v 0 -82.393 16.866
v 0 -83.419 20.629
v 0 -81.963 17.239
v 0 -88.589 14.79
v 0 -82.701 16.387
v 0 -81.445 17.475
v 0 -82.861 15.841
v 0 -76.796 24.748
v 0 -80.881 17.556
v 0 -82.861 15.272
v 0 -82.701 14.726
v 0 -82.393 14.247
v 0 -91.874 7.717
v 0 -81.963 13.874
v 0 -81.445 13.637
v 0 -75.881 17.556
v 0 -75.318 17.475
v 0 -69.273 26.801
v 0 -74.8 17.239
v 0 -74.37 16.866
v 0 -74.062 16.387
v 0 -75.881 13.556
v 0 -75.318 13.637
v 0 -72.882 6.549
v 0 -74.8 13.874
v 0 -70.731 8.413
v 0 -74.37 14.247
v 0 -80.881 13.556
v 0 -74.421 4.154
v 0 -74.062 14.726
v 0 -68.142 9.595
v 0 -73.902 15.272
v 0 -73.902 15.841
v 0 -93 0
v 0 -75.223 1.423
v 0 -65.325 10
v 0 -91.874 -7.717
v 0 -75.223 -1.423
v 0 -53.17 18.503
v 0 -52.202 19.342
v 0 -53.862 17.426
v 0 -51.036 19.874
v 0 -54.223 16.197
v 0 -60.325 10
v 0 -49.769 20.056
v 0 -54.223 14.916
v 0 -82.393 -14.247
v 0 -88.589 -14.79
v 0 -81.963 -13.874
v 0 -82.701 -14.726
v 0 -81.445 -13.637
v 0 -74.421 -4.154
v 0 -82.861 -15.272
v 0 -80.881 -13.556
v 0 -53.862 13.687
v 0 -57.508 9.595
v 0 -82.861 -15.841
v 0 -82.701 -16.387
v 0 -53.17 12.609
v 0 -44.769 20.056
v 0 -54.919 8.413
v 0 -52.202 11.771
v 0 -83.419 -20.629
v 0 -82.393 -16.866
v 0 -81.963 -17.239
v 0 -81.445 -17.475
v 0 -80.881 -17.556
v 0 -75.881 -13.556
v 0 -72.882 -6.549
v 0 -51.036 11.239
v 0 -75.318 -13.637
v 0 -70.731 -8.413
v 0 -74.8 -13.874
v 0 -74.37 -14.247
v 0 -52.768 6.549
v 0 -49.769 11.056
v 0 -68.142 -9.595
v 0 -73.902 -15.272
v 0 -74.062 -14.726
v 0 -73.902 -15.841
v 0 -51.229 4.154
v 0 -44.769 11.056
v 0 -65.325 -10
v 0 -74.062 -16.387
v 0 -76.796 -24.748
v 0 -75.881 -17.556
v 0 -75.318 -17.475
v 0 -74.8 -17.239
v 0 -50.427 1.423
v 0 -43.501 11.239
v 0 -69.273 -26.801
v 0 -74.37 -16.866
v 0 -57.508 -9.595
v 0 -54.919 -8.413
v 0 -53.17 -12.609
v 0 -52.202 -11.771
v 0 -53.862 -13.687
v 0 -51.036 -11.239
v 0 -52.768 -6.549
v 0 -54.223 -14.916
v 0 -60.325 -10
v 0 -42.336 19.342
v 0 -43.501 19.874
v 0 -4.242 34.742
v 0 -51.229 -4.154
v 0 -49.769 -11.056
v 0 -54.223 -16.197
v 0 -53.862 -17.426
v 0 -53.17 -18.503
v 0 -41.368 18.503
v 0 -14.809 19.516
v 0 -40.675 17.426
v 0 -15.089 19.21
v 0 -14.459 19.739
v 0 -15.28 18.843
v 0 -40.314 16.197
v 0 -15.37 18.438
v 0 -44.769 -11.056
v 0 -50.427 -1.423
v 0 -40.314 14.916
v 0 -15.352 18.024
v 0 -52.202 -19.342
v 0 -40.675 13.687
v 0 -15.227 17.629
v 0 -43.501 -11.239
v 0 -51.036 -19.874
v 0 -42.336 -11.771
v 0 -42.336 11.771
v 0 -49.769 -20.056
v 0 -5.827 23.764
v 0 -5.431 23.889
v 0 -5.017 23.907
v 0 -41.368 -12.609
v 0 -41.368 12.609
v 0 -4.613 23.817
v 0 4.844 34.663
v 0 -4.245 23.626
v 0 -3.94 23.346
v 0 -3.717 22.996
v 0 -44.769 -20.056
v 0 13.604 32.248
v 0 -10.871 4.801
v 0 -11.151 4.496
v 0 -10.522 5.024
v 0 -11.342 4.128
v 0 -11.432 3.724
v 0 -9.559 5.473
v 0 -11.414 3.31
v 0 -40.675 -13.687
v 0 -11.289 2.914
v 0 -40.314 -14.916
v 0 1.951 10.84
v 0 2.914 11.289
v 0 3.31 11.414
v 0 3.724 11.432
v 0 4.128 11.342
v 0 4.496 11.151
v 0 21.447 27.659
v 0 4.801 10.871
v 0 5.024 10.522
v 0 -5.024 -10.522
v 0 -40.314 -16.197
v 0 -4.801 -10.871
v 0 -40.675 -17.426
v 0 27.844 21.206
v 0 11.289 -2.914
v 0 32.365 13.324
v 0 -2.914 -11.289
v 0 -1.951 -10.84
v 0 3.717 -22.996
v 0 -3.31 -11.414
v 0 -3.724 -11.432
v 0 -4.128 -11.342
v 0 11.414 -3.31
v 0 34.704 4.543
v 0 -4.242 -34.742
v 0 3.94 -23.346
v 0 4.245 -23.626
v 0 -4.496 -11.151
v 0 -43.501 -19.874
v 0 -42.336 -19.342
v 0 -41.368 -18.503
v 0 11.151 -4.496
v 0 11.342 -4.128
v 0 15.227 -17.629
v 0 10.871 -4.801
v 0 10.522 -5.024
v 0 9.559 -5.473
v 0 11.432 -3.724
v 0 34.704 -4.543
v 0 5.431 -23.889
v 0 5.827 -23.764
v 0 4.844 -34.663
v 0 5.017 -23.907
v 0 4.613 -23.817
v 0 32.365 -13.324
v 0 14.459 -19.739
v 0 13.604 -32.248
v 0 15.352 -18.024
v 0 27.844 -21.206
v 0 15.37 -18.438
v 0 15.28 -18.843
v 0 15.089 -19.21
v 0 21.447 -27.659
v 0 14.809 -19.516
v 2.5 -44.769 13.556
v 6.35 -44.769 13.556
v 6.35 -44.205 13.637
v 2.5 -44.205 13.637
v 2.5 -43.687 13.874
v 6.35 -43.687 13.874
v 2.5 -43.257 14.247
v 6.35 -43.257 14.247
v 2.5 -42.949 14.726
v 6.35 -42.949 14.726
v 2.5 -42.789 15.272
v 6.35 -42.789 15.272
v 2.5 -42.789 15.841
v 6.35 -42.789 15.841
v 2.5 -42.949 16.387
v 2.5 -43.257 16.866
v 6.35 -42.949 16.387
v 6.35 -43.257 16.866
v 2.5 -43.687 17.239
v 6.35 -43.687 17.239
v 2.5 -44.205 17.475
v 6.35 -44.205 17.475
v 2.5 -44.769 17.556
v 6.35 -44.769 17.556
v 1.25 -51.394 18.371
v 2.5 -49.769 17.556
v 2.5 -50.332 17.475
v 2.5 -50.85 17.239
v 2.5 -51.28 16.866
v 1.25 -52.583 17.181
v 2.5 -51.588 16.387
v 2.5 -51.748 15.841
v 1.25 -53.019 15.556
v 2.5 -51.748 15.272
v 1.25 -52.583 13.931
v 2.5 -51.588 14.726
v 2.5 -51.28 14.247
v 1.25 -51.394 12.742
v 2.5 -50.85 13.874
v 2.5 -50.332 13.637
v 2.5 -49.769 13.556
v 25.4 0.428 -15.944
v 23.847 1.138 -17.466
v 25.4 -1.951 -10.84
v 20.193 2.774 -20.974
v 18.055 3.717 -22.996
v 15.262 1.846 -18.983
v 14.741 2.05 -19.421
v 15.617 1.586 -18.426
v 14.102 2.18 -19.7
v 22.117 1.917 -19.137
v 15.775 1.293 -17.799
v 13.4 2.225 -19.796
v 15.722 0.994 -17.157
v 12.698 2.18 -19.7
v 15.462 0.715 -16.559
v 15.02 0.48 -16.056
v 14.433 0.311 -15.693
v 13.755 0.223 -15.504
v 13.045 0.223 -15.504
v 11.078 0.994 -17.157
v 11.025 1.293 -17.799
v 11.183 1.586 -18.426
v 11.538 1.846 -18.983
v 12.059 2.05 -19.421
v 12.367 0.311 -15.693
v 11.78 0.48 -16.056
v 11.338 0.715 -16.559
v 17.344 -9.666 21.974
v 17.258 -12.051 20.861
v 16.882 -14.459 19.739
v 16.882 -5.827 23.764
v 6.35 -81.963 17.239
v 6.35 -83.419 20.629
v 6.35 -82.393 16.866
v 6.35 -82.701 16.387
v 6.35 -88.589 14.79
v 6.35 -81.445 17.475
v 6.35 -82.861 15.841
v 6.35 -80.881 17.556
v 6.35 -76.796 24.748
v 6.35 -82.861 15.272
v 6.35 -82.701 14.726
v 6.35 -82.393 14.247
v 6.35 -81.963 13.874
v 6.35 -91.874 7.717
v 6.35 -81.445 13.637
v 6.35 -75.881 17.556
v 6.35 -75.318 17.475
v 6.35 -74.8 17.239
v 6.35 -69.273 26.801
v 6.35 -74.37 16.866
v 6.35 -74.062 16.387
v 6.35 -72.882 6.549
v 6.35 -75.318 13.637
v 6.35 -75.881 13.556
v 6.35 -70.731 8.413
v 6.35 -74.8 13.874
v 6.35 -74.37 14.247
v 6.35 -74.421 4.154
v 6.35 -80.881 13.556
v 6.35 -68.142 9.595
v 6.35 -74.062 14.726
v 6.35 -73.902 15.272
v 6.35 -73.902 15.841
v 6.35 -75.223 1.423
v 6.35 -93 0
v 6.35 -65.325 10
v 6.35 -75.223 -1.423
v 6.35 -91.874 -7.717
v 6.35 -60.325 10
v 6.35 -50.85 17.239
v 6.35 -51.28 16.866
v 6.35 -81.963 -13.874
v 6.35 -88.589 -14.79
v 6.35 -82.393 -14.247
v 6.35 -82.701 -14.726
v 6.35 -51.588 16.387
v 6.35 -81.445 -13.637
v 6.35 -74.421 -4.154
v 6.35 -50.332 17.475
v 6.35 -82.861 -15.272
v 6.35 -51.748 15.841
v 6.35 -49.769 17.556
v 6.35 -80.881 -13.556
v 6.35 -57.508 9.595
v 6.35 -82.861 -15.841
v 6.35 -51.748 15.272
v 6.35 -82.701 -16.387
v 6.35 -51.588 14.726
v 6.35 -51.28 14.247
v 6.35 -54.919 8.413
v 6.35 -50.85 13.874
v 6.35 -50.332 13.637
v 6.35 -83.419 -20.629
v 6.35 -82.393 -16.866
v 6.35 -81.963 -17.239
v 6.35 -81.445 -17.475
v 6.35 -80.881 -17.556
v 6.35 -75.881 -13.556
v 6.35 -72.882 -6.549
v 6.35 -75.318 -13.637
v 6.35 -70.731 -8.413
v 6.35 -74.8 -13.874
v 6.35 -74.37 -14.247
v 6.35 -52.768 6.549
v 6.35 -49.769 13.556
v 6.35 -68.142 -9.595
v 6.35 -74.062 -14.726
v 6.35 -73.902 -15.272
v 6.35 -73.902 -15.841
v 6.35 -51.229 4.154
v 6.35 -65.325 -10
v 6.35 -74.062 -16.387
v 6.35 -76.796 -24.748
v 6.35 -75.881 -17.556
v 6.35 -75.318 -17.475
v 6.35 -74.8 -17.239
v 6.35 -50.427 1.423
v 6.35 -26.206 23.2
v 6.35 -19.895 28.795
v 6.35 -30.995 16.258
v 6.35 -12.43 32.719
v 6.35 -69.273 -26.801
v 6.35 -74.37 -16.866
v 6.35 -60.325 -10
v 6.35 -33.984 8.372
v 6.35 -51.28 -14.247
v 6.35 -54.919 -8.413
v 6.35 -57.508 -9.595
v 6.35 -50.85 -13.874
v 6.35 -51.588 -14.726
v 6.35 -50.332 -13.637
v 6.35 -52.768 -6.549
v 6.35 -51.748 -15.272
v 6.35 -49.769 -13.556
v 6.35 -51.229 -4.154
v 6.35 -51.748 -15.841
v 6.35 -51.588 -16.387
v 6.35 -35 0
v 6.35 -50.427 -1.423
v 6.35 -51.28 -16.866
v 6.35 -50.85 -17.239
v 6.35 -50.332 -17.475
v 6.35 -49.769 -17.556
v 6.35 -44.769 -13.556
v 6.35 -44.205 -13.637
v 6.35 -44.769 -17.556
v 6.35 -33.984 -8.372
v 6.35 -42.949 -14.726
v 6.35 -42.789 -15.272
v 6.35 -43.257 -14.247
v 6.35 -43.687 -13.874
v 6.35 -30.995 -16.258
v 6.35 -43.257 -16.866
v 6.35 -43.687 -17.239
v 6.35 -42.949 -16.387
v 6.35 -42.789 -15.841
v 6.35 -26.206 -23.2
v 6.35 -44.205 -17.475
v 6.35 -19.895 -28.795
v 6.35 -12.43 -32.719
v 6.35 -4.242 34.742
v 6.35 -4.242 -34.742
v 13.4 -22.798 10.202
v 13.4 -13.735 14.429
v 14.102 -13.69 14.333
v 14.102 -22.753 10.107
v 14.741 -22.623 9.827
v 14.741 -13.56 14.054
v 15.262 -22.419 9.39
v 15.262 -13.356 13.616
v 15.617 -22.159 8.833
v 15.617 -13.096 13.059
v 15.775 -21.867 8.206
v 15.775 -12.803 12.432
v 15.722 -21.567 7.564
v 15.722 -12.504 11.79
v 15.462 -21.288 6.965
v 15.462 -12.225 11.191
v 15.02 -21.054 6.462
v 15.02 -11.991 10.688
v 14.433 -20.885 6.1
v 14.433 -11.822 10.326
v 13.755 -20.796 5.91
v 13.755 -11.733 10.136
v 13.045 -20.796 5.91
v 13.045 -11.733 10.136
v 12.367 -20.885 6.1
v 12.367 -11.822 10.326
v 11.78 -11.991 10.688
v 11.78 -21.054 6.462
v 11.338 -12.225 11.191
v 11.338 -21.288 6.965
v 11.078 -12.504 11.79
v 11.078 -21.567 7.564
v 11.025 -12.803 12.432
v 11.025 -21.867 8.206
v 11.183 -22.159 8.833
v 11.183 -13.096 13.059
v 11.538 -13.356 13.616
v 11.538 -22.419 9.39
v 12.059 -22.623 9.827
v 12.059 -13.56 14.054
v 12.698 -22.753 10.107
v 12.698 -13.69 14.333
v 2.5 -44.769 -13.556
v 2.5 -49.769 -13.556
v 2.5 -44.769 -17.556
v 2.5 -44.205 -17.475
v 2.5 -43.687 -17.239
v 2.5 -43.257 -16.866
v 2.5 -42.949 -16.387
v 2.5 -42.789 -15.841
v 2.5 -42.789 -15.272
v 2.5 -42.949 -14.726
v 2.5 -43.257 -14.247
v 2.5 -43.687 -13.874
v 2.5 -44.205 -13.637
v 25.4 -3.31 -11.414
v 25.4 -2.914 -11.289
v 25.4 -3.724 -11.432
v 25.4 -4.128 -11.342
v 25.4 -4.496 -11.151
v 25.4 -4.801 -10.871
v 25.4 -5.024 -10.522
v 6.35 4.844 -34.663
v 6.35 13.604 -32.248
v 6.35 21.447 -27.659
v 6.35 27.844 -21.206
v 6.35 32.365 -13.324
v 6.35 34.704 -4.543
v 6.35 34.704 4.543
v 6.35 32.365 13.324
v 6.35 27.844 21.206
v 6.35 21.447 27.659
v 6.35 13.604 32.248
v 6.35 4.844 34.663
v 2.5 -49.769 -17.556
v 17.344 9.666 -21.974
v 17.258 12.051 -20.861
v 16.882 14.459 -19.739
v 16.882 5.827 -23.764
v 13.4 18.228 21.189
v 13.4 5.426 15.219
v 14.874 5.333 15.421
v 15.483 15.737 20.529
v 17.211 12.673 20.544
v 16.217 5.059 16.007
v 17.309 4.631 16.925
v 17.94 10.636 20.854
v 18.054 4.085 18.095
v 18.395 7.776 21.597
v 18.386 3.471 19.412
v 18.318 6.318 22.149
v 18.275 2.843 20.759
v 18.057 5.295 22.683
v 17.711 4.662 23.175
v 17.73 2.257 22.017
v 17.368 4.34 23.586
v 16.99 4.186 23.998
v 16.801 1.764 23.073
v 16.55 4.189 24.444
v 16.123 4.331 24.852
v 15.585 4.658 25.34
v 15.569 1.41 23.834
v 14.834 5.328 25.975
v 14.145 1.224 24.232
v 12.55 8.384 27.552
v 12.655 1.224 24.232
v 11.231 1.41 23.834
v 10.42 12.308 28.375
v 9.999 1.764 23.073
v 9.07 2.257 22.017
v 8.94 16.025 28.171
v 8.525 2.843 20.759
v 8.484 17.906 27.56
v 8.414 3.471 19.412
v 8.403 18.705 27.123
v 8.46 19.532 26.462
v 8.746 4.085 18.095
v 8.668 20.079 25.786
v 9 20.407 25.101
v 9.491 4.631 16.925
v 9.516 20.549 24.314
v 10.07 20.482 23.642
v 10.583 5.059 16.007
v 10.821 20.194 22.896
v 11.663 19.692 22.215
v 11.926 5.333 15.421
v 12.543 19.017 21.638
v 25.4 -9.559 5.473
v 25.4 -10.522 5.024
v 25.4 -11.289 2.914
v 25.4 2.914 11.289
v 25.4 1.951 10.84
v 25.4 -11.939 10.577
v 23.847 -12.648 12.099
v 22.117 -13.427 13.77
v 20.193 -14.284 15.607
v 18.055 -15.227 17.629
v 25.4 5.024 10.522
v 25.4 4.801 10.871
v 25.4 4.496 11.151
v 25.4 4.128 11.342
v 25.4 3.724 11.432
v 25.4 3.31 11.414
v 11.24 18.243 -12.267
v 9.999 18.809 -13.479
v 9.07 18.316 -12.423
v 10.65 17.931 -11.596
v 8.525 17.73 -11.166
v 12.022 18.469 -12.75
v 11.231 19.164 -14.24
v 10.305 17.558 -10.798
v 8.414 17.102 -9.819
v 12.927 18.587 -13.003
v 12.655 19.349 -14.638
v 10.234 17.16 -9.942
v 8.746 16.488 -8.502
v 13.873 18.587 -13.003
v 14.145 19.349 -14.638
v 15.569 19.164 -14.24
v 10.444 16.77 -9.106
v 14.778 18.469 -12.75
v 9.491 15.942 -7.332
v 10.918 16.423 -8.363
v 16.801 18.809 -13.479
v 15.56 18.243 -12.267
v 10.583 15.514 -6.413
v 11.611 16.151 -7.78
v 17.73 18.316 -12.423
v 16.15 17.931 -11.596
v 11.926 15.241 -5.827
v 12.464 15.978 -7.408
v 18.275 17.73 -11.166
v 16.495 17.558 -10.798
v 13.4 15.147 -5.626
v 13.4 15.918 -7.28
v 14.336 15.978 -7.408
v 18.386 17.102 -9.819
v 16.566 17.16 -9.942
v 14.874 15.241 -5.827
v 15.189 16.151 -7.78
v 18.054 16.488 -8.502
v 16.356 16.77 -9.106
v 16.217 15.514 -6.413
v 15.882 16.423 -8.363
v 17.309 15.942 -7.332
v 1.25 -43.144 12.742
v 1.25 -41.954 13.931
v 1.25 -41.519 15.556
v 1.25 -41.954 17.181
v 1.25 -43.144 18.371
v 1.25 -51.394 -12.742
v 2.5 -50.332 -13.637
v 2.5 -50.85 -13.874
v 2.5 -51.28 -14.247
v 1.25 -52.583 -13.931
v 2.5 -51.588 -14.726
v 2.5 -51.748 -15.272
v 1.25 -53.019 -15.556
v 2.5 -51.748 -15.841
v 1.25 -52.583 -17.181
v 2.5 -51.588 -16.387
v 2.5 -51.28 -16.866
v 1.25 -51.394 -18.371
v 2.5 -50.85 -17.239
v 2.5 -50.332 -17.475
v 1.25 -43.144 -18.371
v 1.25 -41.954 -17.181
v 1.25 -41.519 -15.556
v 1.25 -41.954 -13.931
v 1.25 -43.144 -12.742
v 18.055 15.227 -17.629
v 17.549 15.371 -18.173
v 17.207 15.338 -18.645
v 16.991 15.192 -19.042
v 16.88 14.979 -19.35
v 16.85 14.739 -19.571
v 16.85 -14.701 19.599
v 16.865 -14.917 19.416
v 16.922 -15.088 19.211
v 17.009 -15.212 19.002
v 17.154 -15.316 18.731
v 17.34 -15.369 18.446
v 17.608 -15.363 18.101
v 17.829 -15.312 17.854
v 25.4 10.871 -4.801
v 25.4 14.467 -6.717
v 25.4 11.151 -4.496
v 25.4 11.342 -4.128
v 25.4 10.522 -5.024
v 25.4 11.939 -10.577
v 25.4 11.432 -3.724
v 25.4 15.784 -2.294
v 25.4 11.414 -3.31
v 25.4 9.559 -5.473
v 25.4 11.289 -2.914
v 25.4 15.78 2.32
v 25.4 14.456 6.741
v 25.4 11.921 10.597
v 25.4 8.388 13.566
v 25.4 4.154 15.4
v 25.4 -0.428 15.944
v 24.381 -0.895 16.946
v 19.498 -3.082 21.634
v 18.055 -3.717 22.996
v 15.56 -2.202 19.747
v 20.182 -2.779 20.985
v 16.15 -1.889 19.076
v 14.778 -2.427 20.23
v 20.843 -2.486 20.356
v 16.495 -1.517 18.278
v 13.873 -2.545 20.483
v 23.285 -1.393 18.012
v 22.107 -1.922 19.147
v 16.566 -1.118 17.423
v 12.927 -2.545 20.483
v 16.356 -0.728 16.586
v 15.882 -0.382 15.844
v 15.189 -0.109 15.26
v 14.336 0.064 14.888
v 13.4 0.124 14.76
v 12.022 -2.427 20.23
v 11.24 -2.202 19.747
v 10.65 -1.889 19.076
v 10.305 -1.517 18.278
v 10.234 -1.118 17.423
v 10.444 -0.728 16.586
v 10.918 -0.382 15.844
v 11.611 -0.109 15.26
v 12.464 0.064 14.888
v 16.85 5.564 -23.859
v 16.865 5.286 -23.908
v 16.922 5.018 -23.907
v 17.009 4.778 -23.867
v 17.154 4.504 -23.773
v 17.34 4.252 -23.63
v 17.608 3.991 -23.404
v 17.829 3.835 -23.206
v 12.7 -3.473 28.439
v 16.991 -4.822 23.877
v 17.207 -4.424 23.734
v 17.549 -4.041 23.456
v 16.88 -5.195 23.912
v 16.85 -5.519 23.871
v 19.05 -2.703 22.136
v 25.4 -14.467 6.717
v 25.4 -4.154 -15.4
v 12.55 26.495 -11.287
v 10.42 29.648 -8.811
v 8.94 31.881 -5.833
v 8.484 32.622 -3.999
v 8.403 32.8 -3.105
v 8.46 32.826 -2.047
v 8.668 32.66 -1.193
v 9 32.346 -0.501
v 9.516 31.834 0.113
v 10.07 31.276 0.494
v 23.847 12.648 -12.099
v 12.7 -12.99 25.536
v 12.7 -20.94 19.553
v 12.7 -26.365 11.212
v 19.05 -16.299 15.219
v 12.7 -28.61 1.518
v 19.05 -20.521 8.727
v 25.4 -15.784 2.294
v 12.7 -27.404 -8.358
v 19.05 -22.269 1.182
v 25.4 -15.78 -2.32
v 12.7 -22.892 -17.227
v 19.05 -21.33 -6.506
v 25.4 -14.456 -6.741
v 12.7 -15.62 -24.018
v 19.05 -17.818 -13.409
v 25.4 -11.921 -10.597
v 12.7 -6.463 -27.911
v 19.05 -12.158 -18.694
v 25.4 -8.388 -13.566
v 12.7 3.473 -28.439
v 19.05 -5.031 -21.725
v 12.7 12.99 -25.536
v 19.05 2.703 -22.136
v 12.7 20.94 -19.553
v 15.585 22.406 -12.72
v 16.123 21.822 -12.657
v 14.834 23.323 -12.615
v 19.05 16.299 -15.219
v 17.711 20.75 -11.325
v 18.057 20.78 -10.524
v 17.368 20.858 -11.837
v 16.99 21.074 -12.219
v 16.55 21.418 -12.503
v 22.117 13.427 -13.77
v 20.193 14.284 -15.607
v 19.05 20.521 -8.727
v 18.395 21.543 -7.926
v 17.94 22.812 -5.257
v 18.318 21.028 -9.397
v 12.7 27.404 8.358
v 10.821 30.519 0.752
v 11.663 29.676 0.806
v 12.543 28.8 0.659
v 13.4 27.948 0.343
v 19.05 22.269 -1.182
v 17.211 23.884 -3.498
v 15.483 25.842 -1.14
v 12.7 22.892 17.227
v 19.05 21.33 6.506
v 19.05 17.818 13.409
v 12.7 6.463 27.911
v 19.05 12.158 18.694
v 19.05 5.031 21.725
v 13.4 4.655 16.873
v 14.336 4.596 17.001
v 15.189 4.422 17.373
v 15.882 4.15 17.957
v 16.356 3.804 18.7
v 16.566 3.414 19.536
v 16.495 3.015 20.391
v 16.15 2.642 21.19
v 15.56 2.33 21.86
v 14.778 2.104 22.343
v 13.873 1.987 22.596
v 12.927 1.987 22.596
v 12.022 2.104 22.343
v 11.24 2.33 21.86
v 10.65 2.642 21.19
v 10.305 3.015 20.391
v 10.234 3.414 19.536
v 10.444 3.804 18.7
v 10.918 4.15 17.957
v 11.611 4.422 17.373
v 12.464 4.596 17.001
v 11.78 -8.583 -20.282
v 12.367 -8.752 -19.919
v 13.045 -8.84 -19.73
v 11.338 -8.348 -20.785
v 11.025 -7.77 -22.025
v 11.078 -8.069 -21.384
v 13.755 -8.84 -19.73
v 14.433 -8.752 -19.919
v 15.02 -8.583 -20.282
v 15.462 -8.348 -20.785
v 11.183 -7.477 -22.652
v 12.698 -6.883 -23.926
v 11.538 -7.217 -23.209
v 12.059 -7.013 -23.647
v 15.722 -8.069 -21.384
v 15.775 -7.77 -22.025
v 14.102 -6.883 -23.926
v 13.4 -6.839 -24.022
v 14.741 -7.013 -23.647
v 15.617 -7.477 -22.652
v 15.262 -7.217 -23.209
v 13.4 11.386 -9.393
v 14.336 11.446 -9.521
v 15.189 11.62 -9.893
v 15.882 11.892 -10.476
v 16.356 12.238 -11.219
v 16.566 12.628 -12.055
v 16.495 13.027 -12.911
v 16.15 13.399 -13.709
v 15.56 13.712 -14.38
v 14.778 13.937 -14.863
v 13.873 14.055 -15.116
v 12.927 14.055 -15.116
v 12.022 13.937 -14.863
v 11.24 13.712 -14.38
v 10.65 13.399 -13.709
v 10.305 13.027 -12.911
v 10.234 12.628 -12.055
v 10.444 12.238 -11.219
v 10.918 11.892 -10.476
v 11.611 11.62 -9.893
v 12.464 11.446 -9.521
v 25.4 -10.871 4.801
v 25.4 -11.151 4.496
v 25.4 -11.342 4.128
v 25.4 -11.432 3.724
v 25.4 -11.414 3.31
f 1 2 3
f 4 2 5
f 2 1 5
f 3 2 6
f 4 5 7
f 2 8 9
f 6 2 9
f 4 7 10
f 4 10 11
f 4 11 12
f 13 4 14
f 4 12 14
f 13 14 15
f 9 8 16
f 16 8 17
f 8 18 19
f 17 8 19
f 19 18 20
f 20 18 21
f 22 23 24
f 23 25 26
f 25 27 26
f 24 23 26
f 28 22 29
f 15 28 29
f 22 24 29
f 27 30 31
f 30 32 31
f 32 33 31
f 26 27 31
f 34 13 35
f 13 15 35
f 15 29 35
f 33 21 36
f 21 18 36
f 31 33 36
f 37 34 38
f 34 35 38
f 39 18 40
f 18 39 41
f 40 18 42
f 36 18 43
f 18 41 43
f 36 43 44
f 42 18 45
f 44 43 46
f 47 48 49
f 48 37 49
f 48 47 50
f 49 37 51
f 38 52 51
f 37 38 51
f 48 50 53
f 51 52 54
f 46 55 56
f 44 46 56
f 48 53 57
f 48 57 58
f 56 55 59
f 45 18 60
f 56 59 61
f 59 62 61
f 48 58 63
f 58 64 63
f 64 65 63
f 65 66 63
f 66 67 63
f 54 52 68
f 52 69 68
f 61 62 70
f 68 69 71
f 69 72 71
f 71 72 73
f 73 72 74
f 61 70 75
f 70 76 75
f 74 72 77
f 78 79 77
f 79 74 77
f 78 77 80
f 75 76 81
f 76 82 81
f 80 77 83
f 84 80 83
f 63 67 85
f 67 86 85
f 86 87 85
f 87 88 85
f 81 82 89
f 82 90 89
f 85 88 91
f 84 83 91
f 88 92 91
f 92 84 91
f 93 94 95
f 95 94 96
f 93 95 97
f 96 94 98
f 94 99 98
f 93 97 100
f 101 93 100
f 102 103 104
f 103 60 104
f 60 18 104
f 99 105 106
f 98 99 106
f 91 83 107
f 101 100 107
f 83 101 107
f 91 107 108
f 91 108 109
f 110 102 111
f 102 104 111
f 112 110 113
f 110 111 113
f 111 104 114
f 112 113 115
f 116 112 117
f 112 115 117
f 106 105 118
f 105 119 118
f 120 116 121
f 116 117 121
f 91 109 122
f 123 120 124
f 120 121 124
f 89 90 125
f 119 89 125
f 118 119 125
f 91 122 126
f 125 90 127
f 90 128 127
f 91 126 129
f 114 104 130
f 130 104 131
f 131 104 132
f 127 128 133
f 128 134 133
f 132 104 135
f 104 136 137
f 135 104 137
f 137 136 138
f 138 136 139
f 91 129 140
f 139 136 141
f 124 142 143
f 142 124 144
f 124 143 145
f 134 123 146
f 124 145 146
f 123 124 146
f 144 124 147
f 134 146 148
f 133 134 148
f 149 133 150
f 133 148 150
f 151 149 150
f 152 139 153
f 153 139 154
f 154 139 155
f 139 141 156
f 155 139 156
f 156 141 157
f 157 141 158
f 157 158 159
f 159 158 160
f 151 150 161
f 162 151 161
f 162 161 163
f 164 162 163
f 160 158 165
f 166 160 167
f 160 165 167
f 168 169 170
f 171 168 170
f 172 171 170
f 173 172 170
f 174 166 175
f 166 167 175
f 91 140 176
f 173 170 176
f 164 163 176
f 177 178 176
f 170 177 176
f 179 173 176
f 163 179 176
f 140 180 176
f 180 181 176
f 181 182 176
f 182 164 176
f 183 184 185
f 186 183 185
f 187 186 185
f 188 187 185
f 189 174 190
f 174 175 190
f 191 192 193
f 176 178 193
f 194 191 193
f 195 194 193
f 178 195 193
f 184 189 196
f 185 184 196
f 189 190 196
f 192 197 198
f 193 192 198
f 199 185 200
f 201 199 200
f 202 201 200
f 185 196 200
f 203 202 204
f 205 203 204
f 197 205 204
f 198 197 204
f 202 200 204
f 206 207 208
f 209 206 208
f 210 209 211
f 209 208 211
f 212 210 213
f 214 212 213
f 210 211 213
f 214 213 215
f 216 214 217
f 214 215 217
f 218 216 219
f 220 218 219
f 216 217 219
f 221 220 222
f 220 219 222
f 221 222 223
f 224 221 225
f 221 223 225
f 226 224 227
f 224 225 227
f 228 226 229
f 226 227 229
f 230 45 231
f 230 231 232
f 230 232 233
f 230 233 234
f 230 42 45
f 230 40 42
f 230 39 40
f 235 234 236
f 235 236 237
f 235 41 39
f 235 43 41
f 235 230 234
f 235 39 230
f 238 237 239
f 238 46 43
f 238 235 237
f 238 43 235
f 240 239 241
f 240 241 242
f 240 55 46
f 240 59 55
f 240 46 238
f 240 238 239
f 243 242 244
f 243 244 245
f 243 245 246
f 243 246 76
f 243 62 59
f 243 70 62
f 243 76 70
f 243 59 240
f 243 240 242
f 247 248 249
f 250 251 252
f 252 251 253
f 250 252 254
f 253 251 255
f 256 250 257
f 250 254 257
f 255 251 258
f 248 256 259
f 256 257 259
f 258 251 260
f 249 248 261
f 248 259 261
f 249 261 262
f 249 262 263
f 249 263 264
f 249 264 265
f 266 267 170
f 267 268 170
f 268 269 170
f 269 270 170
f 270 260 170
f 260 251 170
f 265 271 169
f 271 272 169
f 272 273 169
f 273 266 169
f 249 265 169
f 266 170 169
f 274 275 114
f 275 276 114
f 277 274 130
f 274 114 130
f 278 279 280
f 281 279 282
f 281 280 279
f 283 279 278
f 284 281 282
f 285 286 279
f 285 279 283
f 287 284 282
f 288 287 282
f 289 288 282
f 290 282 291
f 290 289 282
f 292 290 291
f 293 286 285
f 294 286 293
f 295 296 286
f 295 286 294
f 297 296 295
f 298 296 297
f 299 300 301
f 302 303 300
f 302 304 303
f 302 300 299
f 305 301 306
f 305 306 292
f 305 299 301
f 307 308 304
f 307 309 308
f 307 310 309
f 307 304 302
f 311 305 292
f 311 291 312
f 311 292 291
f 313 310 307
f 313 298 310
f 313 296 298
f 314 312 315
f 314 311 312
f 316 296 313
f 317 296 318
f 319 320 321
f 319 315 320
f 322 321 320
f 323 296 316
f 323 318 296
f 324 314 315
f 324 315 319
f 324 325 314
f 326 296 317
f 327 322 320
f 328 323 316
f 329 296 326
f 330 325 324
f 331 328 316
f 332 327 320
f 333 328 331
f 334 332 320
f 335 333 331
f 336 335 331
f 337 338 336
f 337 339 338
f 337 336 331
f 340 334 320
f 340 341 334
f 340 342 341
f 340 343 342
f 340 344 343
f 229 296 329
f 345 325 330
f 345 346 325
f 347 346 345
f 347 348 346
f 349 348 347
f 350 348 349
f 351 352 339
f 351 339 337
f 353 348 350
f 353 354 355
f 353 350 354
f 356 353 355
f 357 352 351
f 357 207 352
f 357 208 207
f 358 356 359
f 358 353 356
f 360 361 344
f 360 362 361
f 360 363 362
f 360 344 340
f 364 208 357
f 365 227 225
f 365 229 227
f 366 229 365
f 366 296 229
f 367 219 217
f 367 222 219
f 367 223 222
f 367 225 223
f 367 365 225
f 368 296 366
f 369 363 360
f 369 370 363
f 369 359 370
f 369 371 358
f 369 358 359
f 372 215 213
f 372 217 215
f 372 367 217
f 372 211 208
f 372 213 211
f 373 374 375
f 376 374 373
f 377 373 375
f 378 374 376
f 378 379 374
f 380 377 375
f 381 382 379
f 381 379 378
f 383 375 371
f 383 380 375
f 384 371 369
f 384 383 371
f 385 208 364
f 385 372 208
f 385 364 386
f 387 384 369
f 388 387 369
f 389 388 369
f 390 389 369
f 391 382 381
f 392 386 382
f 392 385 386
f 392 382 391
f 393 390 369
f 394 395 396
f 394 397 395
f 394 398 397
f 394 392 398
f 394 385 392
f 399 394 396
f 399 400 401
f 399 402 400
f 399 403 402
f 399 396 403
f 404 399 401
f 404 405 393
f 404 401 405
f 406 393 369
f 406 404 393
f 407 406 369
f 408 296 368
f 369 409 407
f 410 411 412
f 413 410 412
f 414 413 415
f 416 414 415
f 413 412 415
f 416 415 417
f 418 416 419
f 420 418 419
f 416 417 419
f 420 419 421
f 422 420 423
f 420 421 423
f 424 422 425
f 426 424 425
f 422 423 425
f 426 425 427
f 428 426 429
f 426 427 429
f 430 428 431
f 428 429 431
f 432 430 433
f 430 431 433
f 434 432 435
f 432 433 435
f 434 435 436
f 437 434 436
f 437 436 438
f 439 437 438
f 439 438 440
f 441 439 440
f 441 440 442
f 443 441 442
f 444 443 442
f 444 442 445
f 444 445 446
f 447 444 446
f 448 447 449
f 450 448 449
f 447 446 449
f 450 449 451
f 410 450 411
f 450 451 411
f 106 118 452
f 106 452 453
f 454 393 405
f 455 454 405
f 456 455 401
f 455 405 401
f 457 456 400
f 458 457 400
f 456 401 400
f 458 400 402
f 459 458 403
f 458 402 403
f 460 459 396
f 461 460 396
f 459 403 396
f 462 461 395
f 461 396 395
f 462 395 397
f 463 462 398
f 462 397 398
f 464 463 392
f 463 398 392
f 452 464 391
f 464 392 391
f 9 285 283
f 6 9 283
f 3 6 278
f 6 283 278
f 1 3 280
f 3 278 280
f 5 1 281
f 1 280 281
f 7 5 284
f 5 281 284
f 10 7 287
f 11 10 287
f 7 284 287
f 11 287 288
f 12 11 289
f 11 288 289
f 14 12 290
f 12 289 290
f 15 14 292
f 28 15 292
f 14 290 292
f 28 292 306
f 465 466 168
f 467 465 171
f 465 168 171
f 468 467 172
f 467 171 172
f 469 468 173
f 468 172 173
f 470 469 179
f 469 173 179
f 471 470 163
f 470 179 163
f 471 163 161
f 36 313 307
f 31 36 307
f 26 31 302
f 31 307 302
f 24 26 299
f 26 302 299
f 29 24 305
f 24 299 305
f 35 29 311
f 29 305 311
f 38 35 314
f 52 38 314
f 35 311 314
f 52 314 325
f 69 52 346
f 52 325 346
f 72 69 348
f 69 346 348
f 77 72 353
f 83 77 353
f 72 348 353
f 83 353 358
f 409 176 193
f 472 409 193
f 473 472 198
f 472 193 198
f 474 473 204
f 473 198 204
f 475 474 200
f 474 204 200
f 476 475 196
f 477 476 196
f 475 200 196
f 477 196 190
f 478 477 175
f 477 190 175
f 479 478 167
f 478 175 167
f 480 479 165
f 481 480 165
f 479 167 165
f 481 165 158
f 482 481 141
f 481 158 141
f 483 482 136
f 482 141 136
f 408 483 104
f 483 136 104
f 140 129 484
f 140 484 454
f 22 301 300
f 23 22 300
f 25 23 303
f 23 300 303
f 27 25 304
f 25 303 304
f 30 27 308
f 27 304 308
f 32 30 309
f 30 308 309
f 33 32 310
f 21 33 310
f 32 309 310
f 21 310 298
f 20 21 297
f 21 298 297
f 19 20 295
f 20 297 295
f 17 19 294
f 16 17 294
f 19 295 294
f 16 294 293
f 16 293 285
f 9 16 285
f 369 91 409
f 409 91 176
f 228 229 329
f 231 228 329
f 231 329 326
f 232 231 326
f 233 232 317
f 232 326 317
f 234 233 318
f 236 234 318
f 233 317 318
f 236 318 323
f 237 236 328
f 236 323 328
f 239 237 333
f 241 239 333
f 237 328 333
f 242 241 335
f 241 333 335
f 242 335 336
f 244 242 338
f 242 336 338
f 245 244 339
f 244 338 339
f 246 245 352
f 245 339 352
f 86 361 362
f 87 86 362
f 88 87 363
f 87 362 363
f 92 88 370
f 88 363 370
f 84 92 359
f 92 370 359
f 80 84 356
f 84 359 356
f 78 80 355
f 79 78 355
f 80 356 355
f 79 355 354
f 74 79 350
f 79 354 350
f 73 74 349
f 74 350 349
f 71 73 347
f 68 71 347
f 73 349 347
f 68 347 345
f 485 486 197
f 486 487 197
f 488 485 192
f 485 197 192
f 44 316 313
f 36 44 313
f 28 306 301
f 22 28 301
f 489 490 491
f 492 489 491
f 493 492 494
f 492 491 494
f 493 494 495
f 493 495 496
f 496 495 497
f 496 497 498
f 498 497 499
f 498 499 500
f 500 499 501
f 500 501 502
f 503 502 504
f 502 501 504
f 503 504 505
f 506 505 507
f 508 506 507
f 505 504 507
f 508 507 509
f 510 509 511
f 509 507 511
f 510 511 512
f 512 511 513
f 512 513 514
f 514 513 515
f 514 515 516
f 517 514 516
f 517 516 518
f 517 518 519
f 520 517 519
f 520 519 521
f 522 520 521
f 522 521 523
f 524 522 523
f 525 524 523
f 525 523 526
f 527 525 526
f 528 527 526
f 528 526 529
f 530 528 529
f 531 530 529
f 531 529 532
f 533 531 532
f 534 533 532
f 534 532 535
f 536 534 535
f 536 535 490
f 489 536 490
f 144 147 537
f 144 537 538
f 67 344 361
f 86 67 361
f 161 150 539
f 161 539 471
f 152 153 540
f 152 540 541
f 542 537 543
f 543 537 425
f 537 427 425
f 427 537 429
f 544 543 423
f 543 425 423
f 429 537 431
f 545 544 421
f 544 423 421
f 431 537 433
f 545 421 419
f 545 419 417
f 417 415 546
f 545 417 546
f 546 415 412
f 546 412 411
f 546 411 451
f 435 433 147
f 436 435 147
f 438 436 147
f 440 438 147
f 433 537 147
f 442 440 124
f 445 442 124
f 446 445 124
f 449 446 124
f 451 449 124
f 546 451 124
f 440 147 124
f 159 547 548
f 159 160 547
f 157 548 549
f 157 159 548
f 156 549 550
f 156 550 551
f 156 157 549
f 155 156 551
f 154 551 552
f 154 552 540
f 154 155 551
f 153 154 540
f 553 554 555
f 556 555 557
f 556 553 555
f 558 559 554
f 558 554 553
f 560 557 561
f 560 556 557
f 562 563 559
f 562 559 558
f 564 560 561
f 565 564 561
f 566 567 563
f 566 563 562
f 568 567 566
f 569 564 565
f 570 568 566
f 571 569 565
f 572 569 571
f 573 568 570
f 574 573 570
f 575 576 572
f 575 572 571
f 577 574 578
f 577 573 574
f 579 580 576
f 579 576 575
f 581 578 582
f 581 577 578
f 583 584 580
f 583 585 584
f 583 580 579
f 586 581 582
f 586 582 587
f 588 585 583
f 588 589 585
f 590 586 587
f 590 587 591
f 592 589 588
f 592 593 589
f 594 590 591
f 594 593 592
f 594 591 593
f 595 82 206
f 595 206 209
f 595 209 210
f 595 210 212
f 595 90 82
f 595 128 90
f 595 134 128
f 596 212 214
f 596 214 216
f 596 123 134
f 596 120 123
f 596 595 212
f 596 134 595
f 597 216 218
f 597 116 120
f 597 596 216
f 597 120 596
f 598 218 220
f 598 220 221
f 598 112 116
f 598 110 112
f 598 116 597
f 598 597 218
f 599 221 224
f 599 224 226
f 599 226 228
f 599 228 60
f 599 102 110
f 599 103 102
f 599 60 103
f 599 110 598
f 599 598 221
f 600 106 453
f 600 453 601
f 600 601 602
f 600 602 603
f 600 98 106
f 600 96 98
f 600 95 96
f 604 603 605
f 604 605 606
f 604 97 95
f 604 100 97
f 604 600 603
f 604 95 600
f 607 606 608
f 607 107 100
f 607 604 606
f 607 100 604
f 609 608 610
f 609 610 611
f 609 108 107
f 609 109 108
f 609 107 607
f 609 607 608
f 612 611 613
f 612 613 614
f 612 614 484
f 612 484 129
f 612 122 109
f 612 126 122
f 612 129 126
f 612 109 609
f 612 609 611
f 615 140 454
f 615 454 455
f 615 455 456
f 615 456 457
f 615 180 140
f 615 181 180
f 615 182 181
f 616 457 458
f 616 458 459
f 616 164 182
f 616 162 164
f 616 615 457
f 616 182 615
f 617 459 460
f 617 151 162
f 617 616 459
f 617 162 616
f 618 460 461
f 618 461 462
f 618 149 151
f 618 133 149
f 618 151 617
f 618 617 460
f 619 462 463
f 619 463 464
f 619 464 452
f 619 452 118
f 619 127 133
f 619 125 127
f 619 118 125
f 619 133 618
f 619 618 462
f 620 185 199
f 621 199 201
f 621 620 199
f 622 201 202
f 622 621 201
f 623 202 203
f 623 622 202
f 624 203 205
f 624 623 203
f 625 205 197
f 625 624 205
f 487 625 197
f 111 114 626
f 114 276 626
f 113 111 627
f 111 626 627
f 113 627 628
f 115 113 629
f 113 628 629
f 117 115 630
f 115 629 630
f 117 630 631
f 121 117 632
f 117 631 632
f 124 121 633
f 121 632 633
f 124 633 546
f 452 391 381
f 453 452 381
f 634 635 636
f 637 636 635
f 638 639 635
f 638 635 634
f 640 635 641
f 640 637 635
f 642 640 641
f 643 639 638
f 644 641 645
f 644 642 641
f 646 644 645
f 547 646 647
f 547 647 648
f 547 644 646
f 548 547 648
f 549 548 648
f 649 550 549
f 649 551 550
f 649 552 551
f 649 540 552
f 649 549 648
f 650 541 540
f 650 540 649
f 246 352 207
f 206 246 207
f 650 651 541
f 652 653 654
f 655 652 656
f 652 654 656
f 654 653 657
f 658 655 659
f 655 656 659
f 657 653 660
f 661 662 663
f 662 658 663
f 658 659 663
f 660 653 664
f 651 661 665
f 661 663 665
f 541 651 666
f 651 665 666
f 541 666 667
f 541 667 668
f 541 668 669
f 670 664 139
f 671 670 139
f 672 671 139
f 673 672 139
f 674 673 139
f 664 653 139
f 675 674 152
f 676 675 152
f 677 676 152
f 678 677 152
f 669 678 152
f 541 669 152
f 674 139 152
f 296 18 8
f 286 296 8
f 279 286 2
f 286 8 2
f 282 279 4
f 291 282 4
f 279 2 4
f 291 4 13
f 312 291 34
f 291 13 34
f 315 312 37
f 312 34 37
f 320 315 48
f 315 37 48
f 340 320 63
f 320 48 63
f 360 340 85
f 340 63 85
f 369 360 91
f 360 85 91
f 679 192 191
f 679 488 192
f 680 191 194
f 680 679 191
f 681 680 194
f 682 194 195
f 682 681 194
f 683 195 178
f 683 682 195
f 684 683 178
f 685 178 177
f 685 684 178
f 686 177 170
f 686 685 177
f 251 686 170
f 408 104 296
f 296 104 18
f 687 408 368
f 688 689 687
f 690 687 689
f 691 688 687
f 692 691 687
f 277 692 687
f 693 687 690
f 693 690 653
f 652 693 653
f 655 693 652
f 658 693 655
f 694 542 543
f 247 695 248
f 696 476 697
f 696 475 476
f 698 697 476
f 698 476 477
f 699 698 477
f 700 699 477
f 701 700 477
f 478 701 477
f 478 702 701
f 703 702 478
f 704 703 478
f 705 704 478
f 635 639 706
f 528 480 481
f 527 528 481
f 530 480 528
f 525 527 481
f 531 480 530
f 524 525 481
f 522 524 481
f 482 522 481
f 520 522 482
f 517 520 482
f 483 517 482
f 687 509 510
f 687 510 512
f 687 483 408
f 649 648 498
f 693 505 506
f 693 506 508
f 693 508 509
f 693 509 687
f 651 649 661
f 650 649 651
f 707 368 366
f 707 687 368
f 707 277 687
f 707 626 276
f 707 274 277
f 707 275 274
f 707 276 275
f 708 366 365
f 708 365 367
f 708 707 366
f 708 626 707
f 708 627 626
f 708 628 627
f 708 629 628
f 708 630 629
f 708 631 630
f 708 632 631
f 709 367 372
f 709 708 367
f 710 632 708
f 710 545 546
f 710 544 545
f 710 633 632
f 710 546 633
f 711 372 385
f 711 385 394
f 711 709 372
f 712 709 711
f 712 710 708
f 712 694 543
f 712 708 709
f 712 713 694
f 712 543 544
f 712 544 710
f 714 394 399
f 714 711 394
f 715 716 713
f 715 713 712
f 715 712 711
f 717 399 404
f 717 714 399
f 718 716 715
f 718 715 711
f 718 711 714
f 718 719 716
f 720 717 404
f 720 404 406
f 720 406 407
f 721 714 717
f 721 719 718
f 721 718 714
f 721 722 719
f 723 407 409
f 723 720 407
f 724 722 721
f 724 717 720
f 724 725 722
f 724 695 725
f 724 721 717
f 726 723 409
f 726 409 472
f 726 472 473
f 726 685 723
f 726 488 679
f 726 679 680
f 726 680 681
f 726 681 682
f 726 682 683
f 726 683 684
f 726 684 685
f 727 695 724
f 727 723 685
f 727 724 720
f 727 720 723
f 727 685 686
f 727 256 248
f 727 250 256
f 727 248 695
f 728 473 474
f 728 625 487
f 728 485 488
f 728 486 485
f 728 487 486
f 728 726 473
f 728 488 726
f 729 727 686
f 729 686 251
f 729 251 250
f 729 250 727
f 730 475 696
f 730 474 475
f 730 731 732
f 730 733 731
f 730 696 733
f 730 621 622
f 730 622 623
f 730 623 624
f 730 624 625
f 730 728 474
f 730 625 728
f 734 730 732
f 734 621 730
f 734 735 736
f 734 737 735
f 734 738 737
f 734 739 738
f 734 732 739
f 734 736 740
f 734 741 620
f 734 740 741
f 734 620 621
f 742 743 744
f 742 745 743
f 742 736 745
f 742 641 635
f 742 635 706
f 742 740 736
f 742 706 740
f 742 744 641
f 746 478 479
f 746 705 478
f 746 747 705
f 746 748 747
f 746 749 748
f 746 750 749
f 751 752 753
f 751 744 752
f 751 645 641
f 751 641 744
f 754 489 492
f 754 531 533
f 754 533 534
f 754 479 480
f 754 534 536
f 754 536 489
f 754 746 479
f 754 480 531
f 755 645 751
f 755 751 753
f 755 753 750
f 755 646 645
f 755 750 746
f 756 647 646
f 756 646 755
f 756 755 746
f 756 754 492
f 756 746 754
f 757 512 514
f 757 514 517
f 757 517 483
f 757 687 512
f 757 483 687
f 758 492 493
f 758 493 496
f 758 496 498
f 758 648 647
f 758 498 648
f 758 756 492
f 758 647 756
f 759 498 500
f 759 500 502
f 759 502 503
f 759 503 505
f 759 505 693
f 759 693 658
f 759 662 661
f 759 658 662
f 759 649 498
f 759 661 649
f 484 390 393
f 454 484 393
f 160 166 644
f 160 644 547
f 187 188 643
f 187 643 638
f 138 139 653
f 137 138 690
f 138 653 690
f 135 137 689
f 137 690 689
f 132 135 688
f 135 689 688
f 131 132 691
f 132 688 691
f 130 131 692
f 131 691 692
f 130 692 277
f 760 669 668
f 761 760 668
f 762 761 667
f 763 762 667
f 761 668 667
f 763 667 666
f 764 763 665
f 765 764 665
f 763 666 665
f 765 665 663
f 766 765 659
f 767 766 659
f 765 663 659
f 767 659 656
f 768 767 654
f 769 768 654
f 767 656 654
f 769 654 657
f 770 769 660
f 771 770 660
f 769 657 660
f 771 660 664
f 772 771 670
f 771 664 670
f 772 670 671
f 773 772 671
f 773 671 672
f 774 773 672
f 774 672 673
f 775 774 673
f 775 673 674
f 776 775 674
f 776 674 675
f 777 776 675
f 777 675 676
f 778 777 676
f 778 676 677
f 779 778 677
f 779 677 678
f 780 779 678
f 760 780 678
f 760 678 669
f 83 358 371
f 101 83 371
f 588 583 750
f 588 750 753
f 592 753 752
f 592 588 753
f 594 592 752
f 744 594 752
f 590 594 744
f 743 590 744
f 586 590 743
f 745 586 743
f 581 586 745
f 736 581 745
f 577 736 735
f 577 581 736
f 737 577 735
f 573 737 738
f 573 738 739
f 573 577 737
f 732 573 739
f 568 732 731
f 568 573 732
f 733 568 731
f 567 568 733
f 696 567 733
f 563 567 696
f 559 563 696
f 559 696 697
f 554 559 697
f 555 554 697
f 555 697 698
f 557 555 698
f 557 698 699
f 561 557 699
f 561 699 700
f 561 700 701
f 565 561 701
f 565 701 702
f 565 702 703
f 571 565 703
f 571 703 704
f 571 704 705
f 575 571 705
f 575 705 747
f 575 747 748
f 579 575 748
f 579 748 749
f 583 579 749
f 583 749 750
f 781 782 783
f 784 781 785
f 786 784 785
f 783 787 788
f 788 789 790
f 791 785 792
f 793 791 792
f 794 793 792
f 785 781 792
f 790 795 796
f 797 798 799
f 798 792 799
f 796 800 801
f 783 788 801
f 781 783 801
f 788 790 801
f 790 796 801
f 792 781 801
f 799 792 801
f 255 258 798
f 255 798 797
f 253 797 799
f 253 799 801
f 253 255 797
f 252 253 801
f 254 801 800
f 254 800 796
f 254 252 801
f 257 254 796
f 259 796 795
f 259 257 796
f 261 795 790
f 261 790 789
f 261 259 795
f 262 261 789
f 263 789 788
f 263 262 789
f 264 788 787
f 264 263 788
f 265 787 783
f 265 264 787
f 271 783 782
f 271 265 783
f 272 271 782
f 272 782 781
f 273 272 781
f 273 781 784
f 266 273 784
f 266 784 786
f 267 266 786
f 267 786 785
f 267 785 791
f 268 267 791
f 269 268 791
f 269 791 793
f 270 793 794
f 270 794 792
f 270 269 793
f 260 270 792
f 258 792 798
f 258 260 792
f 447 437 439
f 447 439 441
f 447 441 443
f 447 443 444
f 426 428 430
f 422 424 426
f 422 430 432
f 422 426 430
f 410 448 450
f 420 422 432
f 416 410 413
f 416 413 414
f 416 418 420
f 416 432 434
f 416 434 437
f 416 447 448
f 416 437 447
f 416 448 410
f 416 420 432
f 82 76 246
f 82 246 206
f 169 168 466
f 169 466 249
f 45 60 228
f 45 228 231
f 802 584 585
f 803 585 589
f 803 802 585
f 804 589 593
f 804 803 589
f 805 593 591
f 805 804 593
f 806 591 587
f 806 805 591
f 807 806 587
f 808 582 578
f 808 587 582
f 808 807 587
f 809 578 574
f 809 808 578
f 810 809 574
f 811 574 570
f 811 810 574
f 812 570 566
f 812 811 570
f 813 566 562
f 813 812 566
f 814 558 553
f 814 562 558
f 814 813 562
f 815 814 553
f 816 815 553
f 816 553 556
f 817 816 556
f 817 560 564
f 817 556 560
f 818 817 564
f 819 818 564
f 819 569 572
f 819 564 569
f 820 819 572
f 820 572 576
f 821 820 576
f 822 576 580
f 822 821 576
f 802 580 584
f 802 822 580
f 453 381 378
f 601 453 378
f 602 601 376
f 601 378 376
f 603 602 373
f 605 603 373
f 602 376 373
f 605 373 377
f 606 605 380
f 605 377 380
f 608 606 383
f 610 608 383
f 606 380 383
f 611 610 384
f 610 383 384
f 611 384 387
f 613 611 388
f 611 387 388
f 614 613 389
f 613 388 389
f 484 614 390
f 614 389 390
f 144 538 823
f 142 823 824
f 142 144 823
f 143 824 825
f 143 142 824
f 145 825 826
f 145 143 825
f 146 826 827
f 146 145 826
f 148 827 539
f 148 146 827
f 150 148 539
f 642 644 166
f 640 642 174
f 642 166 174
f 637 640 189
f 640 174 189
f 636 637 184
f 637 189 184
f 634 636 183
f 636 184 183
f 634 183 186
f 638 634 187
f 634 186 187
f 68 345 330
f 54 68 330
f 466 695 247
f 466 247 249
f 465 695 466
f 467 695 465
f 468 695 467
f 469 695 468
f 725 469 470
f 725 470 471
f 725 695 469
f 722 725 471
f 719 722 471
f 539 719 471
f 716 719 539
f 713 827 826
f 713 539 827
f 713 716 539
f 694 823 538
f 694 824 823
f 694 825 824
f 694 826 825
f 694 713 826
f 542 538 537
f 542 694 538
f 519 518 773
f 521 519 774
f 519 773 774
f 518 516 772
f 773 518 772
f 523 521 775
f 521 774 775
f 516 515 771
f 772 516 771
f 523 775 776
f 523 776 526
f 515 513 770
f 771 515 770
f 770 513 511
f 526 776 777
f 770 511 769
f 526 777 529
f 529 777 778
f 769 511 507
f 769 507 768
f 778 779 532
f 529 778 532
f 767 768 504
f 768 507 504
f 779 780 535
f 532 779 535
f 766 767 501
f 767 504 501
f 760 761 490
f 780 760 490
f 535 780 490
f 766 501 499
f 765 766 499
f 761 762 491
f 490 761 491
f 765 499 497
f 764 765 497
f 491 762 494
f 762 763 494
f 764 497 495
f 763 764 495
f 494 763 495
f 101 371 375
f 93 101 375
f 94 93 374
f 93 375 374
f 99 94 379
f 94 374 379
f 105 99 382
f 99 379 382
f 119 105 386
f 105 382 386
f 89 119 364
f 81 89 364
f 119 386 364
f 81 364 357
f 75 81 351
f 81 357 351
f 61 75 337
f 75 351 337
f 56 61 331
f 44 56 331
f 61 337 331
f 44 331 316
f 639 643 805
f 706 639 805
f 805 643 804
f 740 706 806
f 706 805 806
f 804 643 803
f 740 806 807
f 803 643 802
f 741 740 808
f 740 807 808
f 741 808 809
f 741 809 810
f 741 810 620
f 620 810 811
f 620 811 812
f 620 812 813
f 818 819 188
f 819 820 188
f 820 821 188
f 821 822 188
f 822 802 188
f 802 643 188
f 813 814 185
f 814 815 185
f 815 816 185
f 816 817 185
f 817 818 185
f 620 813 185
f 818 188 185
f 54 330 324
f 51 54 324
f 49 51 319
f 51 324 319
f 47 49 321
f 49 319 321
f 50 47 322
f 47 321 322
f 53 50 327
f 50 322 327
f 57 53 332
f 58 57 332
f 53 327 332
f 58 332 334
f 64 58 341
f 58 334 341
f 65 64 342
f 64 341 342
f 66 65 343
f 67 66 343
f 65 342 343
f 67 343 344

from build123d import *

# Parameters (mm, degrees)
BOSS_EXTRUDE1_DEPTH = 6.35
SKETCH20_R          = 35
BOSS_EXTRUDE5_DEPTH = 19.05
CUT_EXTRUDE14_DEPTH = 103.562956276
CHAMFER1_SIZE       = 19.05
SKETCH22_R          = 3.175
CUT_EXTRUDE15_DEPTH = 109.709596838
SKETCH24_R          = 5
CUT_EXTRUDE16_DEPTH = 114.565219549
SKETCH25_R          = 2.38125
CUT_EXTRUDE17_DEPTH = 10
CUT_EXTRUDE18_DEPTH = 10
CHAMFER2_SIZE       = 2.5
FILLET1_R           = 1.5875


with BuildPart() as part:
    # Sketch1 → Boss-Extrude1 (new body)
    with BuildSketch(Plane(origin=(0, 0, 0), x_dir=(0, 0, -1), z_dir=(1, 0, 0))):
        with BuildLine():
            Line((-34.741931963, -4.242424242), (-26.800918943, -69.272727273))
            ThreePointArc((-26.800918943, -69.272727273), (0, -93), (26.800918943, -69.272727273))
            Line((26.800918943, -69.272727273), (34.741931963, -4.242424242))
            ThreePointArc((34.741931963, -4.242424242), (0, 35), (-34.741931963, -4.242424242))
        make_face()
        Polygon((4.353205728, 11.960334439), (-11.960334439, 4.353205728), (-4.353205728, -11.960334439), (11.960334439, -4.353205728), align=None, mode=Mode.SUBTRACT)
    extrude(amount=BOSS_EXTRUDE1_DEPTH)

    # Sketch20 → Boss-Extrude5 (add)
    with BuildSketch(Plane(origin=(6.35, 0, 0), x_dir=(0, 0, -1), z_dir=(1, 0, 0))):
        with Locations(Location((0, 0, 0), (0, 0, 186.962062691))):
            Circle(SKETCH20_R)
    extrude(amount=BOSS_EXTRUDE5_DEPTH)

    # Sketch21 → Cut-Extrude14 (cut, through all)
    with BuildSketch(Plane.ZY):
        Polygon((-19.067760927, 15.897892729), (-24.435012851, 4.387783834), (-10.840396045, -1.951490092), (-5.473144121, 9.558618803), align=None)
        Polygon((-11.960334439, -4.353205728), (-4.353205728, 11.960334439), (11.960334439, 4.353205728), (4.353205728, -11.960334439), align=None)
        Polygon((10.840396045, 1.951490092), (5.473144121, -9.558618803), (19.067760927, -15.897892729), (24.435012851, -4.387783834), align=None)
    extrude(amount=-CUT_EXTRUDE14_DEPTH, mode=Mode.SUBTRACT)

    # Chamfer1
    # the kernel refuses this chamfer: 19.05 mm, written as the material it takes off along each edge
    with BuildSketch(Plane(origin=(25.4, 0, 0), x_dir=(0, -0.1212121212106579, 0.9926266275249788), z_dir=(0, 0.9926266275249788, 0.1212121212106579))) as chamfer1_piece_1:
        Polygon((35, -CHAMFER1_SIZE), (35 - CHAMFER1_SIZE, 0), (35, 0), align=None)
    revolve(axis=Axis((25.4, 0, 0), (1, 0, 0)), mode=Mode.SUBTRACT)

    # Sketch22 → Cut-Extrude15 (cut, through all)
    with BuildSketch(Plane(origin=(0, 5.755054448, 2.683625962), x_dir=(-1, 0, 0), z_dir=(0, -0.9063077870366495, -0.4226182617407006))):
        with Locations(Location((-13.4, -16.5, 0), (0, 0, 90))):
            Circle(SKETCH22_R)
    cut_extrude15 = extrude(amount=-CUT_EXTRUDE15_DEPTH, mode=Mode.SUBTRACT)

    # Sketch24 → Cut-Extrude16 (cut, through all)
    with BuildSketch(Plane(origin=(0, 10.286593383, 4.796717271), x_dir=(-1, 0, 0), z_dir=(0, -0.9063077870366495, -0.4226182617407006))):
        with Locations(Location((-13.4, -16.5, 0), (0, 0, 90))):
            Circle(SKETCH24_R)
    cut_extrude16 = extrude(amount=-CUT_EXTRUDE16_DEPTH, mode=Mode.SUBTRACT)

    # Sketch25 → Cut-Extrude17 (cut)
    with BuildSketch(Plane(origin=(0, -5.755054448, -2.683625962), x_dir=(1, 0, 0), z_dir=(0, 0.9063077870366495, 0.4226182617407006))):
        with Locations(Location((13.4, -16.5, 0), (0, 0, 270))):
            Circle(SKETCH25_R)
    cut_extrude17 = extrude(amount=-CUT_EXTRUDE17_DEPTH, mode=Mode.SUBTRACT)

    # Mirror1: Cut-Extrude15, Cut-Extrude16, Cut-Extrude17 across plane
    add(cut_extrude15.mirror(Plane(origin=(0, 0, 0), x_dir=(1, 0, 0), z_dir=(0, 0.422618261740701, -0.9063077870366492))), mode=Mode.SUBTRACT)
    add(cut_extrude16.mirror(Plane(origin=(0, 0, 0), x_dir=(1, 0, 0), z_dir=(0, 0.422618261740701, -0.9063077870366492))), mode=Mode.SUBTRACT)
    add(cut_extrude17.mirror(Plane(origin=(0, 0, 0), x_dir=(1, 0, 0), z_dir=(0, 0.422618261740701, -0.9063077870366492))), mode=Mode.SUBTRACT)

    # Sketch19 → Cut-Extrude18 (cut)
    with BuildSketch(Plane(origin=(6.35, 0, 0), x_dir=(0, 0, -1), z_dir=(1, 0, 0))):
        with BuildLine():
            Line((13.556349186, -44.768650814), (13.556349186, -49.768650814))
            ThreePointArc((13.556349186, -49.768650814), (15.556349186, -51.768650814), (17.556349186, -49.768650814))
            Line((17.556349186, -49.768650814), (17.556349186, -44.768650814))
            ThreePointArc((17.556349186, -44.768650814), (15.556349186, -42.768650814), (13.556349186, -44.768650814))
        make_face()
        with BuildLine():
            Line((-10, -60.325), (-10, -65.325))
            ThreePointArc((-10, -65.325), (0, -75.325), (10, -65.325))
            Line((10, -65.325), (10, -60.325))
            ThreePointArc((10, -60.325), (0, -50.325), (-10, -60.325))
        make_face()
        with BuildLine():
            Line((17.556349186, -80.881349186), (17.556349186, -75.881349186))
            ThreePointArc((17.556349186, -75.881349186), (15.556349186, -73.881349186), (13.556349186, -75.881349186))
            Line((13.556349186, -75.881349186), (13.556349186, -80.881349186))
            ThreePointArc((13.556349186, -80.881349186), (15.556349186, -82.881349186), (17.556349186, -80.881349186))
        make_face()
        with BuildLine():
            Line((-17.556349186, -44.768650814), (-17.556349186, -49.768650814))
            ThreePointArc((-17.556349186, -49.768650814), (-15.556349186, -51.768650814), (-13.556349186, -49.768650814))
            Line((-13.556349186, -49.768650814), (-13.556349186, -44.768650814))
            ThreePointArc((-13.556349186, -44.768650814), (-15.556349186, -42.768650814), (-17.556349186, -44.768650814))
        make_face()
        with BuildLine():
            Line((-13.556349186, -80.881349186), (-13.556349186, -75.881349186))
            ThreePointArc((-13.556349186, -75.881349186), (-15.556349186, -73.881349186), (-17.556349186, -75.881349186))
            Line((-17.556349186, -75.881349186), (-17.556349186, -80.881349186))
            ThreePointArc((-17.556349186, -80.881349186), (-15.556349186, -82.881349186), (-13.556349186, -80.881349186))
        make_face()
    extrude(amount=-CUT_EXTRUDE18_DEPTH, mode=Mode.SUBTRACT)


with BuildPart() as body_2:
    # Mirror2: mirrored copy
    add(part.part.mirror(Plane(origin=(0, 0, 0), x_dir=(0, 0, 1), z_dir=(1, 0, 0))))


with BuildPart() as part_1:
    add(part.part)

    # Chamfer2
    chamfer2_edges = [part_1.edges().sort_by_distance(p)[0] for p in [
        (0, -47.268650814, 13.556349186),
        (0, -42.768650814, 15.556349186),
        (0, -47.268650814, 17.556349186),
        (0, -51.768650814, 15.556349186),
        (0, -47.268650814, -17.556349186),
        (0, -42.768650814, -15.556349186),
        (0, -47.268650814, -13.556349186),
        (0, -51.768650814, -15.556349186),
    ]]
    chamfer(chamfer2_edges, length=CHAMFER2_SIZE)

    # Fillet1
    fillet1_edges = [part_1.edges().sort_by_distance(p)[0] for p in [
        (12.7, -4.353205728, -11.960334439),
        (8.262078305, 4.387783834, -24.435012851),
        (12.7, 11.960334439, -4.353205728),
        (8.262078305, 15.897892729, -19.067760927),
        (8.262078305, -4.387783834, 24.435012851),
        (12.7, 4.353205728, 11.960334439),
        (12.7, -11.960334439, 4.353205728),
        (8.262078305, -15.897892729, 19.067760927),
    ]]
    fillet(fillet1_edges, radius=FILLET1_R)


solid = part_1.part
